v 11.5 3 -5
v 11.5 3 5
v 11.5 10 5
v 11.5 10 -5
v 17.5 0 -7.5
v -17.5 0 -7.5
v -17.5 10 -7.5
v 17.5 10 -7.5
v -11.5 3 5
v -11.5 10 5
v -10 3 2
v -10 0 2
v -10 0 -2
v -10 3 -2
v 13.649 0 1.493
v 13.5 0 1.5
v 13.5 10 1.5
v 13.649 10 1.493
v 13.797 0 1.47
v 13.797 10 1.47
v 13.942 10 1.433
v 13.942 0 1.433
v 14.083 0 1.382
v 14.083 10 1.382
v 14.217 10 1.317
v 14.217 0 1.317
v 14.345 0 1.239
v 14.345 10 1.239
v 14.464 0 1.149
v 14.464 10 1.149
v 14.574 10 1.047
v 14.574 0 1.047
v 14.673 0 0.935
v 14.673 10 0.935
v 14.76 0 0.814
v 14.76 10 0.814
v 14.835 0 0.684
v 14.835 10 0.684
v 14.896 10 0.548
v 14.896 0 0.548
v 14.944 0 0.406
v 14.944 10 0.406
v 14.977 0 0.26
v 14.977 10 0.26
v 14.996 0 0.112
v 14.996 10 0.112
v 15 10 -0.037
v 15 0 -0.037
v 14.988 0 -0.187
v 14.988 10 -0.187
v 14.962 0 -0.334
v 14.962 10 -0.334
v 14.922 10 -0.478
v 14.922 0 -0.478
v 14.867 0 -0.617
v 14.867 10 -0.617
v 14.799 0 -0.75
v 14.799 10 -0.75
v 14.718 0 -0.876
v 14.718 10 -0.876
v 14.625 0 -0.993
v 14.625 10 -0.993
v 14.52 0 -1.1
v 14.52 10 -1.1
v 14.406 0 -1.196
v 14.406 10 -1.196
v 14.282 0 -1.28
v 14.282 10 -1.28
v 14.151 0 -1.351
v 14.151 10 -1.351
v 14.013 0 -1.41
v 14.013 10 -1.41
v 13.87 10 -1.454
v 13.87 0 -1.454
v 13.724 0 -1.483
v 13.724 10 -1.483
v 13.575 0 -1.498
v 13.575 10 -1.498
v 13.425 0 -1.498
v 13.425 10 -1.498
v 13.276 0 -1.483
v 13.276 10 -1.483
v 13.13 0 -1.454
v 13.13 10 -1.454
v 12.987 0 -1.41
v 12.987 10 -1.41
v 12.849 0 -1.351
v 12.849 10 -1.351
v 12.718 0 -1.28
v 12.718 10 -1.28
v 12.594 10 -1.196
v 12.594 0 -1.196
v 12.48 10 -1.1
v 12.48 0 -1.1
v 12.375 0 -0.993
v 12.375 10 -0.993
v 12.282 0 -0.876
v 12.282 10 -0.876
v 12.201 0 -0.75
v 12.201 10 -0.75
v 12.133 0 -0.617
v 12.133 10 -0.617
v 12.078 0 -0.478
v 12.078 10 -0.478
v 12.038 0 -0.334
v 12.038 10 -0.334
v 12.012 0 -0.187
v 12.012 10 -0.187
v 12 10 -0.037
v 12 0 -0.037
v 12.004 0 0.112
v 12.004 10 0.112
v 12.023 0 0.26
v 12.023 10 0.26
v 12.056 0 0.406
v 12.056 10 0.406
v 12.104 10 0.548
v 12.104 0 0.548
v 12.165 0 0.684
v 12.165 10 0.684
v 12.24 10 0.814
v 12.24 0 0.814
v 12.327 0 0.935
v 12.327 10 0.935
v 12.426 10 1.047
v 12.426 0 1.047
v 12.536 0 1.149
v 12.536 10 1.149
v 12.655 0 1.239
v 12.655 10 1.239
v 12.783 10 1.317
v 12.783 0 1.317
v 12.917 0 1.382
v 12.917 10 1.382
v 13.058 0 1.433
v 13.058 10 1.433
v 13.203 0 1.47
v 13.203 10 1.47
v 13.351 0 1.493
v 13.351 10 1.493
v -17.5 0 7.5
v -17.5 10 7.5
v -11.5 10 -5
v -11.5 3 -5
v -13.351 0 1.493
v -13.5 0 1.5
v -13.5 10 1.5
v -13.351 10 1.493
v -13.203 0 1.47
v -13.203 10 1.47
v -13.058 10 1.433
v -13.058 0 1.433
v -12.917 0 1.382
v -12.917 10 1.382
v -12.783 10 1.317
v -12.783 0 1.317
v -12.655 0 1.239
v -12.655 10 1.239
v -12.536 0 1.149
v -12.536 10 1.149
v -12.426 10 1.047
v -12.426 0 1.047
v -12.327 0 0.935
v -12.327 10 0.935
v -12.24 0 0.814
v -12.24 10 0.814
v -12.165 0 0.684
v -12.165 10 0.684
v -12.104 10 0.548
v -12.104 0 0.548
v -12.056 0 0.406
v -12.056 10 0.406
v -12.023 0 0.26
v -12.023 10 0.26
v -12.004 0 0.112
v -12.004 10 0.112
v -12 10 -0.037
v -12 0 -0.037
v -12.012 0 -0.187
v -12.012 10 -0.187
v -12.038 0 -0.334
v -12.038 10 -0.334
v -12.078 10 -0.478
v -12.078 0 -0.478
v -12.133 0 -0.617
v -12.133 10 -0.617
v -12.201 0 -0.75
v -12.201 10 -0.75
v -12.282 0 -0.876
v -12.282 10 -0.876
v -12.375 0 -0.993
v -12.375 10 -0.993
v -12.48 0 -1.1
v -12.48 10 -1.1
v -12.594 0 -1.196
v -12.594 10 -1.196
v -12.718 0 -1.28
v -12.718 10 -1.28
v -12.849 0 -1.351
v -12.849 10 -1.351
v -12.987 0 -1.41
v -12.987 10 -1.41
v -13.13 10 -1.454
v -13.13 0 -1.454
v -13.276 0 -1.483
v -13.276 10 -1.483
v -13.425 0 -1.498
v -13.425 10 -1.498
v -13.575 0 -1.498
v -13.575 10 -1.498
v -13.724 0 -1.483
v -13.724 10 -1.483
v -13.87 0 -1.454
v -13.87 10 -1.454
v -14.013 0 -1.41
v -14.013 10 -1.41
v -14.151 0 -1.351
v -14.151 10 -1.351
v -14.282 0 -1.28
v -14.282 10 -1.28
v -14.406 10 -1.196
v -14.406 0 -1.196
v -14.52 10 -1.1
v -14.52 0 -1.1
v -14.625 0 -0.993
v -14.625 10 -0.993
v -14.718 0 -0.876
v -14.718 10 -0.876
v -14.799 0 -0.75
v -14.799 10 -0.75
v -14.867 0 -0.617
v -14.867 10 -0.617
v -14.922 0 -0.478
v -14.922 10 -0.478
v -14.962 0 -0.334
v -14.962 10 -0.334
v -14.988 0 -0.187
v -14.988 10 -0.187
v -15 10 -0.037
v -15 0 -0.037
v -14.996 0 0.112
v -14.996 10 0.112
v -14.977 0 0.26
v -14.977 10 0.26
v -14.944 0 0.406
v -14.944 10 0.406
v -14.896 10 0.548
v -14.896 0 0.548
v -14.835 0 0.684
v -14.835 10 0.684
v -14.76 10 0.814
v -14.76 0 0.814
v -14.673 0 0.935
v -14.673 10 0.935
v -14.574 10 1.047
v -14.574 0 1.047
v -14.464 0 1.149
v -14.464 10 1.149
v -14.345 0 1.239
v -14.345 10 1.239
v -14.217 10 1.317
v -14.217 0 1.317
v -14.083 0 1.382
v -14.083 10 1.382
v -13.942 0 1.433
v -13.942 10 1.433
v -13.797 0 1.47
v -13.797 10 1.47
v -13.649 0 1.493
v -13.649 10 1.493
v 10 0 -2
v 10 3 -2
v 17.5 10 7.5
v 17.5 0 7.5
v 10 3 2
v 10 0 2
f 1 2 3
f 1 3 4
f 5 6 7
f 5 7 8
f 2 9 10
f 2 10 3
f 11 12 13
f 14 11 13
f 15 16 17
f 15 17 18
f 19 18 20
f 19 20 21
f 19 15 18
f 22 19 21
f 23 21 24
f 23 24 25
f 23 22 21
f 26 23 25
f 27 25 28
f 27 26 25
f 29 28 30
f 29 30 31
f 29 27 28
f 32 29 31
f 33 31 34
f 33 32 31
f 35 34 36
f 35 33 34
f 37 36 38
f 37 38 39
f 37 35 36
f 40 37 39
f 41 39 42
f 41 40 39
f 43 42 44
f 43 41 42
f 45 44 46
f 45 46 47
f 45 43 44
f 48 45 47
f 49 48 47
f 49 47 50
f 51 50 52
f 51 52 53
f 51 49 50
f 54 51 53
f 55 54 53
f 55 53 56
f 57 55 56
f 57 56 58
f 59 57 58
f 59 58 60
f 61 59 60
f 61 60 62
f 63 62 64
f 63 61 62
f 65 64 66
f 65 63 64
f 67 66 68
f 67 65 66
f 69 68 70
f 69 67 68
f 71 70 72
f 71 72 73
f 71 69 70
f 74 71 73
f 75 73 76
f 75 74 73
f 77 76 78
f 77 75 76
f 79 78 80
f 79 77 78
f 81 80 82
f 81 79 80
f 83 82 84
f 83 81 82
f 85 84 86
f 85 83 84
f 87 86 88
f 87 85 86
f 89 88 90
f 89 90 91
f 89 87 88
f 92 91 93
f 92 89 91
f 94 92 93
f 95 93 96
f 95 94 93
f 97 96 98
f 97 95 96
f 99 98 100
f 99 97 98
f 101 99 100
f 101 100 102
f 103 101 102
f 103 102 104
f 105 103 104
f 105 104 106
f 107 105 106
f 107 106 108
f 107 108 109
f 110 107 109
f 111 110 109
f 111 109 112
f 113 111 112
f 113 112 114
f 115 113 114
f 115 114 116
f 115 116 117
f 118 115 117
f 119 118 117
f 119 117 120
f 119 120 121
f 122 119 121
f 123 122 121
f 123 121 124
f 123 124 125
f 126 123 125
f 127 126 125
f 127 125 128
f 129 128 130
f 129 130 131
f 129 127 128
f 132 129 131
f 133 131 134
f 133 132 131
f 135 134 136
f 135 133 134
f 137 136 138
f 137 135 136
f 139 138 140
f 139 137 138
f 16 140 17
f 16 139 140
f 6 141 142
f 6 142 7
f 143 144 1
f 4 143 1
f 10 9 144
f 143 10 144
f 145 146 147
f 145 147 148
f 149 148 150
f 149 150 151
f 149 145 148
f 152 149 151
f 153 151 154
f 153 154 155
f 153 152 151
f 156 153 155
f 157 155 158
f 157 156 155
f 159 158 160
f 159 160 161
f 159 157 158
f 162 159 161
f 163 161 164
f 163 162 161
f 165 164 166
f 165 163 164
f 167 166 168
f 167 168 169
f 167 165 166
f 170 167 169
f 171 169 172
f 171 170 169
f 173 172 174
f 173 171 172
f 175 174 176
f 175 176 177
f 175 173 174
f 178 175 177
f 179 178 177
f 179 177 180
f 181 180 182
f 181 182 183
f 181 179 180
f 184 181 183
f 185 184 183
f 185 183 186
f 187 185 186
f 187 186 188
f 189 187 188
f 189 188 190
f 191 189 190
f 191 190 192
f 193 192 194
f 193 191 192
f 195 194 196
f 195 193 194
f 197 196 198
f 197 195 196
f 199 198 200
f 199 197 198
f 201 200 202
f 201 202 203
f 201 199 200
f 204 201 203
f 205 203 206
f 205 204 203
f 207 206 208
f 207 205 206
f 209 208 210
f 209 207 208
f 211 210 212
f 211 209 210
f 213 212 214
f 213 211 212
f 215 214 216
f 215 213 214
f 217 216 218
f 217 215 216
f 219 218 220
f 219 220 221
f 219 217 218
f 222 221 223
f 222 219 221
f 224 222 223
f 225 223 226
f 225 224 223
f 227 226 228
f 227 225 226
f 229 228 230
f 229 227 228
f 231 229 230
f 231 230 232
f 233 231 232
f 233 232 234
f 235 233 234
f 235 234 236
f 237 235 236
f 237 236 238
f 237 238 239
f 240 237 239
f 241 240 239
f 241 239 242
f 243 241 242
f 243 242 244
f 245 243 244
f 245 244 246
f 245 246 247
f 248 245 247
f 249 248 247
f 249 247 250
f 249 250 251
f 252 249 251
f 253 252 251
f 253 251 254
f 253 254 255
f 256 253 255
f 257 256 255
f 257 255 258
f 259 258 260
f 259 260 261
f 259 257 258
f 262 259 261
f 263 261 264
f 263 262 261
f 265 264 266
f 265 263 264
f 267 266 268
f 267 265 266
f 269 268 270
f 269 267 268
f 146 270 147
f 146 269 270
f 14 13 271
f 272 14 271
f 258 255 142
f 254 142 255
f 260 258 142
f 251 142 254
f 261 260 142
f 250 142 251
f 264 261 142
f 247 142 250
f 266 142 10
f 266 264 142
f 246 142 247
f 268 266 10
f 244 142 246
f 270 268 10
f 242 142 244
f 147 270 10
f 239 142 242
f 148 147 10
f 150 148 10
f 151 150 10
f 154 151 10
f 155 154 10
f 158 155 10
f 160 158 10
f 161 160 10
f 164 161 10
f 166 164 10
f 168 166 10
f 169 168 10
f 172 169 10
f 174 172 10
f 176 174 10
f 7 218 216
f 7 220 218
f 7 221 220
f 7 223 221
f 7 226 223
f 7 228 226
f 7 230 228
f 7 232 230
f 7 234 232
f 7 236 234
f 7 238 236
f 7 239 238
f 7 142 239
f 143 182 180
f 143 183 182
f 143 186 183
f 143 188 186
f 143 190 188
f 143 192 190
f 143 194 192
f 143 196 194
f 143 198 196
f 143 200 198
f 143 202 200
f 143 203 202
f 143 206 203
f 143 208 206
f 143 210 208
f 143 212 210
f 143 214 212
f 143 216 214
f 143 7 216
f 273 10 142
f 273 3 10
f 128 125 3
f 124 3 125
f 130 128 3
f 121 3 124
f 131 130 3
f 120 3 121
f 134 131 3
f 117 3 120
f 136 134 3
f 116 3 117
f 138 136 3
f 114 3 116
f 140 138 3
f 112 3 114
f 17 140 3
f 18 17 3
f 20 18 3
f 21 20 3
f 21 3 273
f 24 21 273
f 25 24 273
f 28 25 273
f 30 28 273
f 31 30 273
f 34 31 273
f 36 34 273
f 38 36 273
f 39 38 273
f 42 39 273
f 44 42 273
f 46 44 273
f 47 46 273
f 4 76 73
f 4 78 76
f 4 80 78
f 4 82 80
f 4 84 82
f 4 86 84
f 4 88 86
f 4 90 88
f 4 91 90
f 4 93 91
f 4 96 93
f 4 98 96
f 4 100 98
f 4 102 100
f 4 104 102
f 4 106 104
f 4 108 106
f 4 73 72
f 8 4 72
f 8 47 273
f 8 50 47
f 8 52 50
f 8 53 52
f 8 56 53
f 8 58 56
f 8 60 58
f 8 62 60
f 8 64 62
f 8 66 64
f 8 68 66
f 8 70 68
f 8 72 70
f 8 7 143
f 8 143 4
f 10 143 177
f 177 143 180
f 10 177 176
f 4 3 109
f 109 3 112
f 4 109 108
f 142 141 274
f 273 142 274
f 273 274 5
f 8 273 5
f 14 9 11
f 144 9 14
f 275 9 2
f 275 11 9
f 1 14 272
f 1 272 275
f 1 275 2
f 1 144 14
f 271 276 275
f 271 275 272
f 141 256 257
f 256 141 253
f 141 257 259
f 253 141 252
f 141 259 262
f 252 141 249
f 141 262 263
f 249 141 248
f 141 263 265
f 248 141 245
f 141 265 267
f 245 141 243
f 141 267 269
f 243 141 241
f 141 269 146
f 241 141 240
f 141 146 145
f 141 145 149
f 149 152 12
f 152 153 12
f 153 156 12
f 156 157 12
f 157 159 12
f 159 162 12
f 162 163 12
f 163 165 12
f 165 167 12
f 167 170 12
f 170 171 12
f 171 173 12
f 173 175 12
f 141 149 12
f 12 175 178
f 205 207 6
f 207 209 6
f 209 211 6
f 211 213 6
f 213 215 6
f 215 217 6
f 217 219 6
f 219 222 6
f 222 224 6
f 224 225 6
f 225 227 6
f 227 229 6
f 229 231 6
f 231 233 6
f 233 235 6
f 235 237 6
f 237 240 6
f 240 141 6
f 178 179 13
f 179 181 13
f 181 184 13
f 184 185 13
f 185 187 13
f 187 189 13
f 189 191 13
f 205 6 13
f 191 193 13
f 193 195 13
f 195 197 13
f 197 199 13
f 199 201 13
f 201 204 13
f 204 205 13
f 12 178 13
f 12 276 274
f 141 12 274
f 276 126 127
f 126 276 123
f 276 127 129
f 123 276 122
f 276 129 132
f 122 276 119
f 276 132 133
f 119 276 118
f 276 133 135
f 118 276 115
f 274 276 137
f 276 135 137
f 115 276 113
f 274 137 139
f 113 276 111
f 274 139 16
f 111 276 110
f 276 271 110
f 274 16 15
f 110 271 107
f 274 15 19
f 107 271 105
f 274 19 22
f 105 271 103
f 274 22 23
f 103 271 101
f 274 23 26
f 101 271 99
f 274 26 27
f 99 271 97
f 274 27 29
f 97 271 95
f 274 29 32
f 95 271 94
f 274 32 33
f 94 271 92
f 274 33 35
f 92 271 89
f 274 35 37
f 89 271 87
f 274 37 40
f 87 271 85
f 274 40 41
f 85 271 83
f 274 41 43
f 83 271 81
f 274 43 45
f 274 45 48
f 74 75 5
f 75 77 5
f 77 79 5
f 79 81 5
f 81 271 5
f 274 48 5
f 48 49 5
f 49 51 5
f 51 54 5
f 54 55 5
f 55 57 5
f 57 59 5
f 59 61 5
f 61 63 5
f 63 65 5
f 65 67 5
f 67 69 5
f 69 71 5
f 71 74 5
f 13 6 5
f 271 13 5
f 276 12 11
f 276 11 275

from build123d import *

# Parameters (mm, degrees)
SKETCH_1_W      = 35
SKETCH_1_H      = 15
SKETCH_1_R      = 1.5
SKETCH_1_W_2    = 23
SKETCH_1_H_2    = 10
EXTRUDE_1_DEPTH = 10
SKETCH_1_3_W    = 23
SKETCH_1_3_H    = 10
SKETCH_1_3_W_2  = 20
SKETCH_1_3_H_2  = 4
EXTRUDE_2_DEPTH = 3


with BuildPart() as part:
    # Эскиз1 → Бобышка-Вытянуть1 (new body)
    with BuildSketch(Plane(origin=(0, 0, 0), x_dir=(1, 0, 0), z_dir=(0, 1, 0))):
        Rectangle(SKETCH_1_W, SKETCH_1_H)
        with Locations((-13.5, 0)):
            Circle(SKETCH_1_R, mode=Mode.SUBTRACT)
        Rectangle(SKETCH_1_W_2, SKETCH_1_H_2, mode=Mode.SUBTRACT)
        with Locations((13.5, 0)):
            Circle(SKETCH_1_R, mode=Mode.SUBTRACT)
    extrude(amount=EXTRUDE_1_DEPTH)

    # Эскиз1<3> → Бобышка-Вытянуть2 (add)
    with BuildSketch(Plane(origin=(0, 0, 0), x_dir=(1, 0, 0), z_dir=(0, 1, 0))):
        Rectangle(SKETCH_1_3_W, SKETCH_1_3_H)
        Rectangle(SKETCH_1_3_W_2, SKETCH_1_3_H_2, mode=Mode.SUBTRACT)
    extrude(amount=EXTRUDE_2_DEPTH)


solid = part.part
